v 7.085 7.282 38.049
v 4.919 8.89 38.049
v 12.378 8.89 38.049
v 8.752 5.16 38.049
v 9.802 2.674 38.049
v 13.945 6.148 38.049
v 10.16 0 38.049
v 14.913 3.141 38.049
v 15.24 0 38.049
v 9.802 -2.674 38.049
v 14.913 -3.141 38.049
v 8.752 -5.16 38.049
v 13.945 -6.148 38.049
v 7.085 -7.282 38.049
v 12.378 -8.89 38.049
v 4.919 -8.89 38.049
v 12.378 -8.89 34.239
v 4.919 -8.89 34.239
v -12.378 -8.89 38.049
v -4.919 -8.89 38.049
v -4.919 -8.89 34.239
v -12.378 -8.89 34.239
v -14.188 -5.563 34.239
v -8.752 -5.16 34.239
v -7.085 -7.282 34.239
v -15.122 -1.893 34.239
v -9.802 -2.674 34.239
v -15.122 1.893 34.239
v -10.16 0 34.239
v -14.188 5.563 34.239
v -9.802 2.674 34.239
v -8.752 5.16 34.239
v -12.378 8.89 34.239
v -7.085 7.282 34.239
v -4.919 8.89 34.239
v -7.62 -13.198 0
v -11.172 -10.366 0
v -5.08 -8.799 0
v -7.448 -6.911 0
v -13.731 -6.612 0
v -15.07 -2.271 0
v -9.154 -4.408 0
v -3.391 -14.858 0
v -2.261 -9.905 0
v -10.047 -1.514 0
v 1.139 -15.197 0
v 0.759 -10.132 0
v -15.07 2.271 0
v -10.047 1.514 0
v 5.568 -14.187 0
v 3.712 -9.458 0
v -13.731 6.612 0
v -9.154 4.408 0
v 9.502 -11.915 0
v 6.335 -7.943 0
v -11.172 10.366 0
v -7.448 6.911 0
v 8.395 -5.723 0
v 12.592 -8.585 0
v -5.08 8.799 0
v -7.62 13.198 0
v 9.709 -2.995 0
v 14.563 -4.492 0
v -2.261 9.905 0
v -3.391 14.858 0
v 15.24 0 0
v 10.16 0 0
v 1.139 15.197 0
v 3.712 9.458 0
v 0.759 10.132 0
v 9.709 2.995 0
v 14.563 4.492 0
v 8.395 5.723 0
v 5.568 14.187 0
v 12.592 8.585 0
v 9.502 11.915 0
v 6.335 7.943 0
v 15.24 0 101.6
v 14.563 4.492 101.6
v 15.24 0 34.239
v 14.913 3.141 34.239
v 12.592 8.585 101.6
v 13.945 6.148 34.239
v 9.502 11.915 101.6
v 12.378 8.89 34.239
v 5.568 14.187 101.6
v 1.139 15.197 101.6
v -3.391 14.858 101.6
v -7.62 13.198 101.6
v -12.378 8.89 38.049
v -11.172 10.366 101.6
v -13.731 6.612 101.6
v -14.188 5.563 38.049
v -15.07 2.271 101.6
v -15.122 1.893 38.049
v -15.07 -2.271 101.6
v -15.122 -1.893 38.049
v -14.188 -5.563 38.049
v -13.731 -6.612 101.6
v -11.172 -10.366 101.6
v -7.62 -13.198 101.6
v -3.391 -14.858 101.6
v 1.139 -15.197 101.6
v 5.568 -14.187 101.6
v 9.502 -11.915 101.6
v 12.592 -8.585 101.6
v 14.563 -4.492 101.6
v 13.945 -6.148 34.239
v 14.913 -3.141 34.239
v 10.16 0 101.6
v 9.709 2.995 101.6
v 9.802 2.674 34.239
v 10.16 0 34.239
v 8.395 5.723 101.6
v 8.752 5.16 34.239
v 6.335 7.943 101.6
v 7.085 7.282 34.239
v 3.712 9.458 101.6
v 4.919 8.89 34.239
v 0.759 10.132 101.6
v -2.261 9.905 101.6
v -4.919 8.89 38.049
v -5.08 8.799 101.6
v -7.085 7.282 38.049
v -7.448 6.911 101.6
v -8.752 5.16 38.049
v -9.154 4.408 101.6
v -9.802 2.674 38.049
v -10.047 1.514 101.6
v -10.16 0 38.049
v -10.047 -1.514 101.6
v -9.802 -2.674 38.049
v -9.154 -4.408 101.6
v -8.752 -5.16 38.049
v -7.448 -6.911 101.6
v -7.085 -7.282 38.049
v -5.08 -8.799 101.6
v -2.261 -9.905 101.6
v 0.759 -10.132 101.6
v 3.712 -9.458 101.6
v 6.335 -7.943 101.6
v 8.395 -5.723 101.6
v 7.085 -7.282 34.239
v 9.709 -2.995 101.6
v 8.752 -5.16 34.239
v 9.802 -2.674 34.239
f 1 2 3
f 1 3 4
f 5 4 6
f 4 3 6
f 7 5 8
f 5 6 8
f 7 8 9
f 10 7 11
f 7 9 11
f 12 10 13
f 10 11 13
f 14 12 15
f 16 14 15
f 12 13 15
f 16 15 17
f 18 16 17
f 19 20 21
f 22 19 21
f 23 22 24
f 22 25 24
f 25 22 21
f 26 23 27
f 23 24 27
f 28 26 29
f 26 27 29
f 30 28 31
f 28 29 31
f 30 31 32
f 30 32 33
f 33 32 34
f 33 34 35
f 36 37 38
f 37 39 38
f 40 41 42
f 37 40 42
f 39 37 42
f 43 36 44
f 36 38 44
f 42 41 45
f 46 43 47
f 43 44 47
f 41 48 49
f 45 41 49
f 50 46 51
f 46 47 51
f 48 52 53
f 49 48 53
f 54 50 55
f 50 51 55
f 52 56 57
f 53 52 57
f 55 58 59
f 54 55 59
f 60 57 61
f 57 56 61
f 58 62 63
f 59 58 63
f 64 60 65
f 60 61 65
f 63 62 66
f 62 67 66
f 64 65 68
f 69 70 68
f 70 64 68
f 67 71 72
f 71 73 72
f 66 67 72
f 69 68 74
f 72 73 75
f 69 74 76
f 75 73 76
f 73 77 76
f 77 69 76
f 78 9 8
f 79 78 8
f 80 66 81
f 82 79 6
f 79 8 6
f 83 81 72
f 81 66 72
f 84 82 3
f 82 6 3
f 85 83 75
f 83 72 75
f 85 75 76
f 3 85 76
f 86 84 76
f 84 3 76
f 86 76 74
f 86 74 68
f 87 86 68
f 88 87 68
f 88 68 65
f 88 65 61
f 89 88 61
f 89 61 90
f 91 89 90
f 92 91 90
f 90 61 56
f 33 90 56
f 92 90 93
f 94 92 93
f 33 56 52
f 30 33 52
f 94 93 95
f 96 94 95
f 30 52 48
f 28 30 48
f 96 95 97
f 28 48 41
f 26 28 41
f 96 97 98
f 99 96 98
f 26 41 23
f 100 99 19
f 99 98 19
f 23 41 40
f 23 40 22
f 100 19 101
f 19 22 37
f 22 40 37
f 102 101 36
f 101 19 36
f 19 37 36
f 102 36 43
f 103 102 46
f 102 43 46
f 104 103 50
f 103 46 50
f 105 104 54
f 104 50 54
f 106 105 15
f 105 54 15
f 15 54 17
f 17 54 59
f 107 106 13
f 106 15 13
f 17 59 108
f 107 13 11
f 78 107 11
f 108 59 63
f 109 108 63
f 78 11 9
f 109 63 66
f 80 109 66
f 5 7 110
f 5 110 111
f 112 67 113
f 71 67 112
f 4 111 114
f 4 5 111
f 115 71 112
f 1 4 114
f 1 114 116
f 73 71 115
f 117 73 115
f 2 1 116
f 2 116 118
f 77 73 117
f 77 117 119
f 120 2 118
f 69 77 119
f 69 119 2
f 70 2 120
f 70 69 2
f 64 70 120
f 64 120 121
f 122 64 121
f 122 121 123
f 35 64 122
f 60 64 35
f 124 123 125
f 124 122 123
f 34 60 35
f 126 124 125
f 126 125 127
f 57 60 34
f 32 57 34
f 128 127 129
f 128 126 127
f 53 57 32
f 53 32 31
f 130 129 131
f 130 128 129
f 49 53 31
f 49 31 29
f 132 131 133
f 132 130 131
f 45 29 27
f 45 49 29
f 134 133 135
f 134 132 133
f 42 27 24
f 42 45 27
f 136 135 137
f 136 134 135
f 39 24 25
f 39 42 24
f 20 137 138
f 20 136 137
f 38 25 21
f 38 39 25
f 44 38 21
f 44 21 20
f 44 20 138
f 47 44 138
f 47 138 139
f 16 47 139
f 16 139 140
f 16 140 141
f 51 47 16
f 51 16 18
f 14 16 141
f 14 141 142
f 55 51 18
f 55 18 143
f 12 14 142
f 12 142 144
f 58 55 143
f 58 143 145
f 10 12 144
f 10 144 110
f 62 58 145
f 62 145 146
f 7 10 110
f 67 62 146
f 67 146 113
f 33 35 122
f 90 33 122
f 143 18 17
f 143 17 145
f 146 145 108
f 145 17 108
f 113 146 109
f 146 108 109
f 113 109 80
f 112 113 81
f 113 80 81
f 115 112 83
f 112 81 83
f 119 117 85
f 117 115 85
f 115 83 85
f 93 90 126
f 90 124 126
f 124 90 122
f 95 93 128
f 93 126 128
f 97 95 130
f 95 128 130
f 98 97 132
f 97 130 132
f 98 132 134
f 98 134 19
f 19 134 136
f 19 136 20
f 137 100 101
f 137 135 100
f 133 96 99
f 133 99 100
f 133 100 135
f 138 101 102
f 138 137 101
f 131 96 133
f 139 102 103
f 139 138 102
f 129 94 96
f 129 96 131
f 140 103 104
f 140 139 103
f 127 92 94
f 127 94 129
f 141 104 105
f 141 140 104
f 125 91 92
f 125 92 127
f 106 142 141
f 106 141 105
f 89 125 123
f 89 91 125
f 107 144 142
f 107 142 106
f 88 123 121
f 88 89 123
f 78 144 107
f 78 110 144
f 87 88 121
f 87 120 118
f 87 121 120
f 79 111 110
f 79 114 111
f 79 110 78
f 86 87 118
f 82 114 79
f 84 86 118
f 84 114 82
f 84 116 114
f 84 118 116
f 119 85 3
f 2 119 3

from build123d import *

# Parameters (mm, degrees)
F0_R     = 15.24
F0_R_2   = 10.16
F1_DEPTH = 101.6
F3_DEPTH = 38.1


with BuildPart() as f1:
    # F0 (on Top) → F1 (new body)
    with BuildSketch(Plane.XY):
        Circle(F0_R)
        Circle(F0_R_2, mode=Mode.SUBTRACT)
    extrude(amount=F1_DEPTH)


with BuildPart() as f3:
    # F2 (on Right) → F3 (new body, symmetric)
    with BuildSketch(Plane.YZ):
        Polygon((-8.89, 34.2392), (0, 34.2392), (8.89, 34.2392), (8.89, 38.0492), (-8.89, 38.0492), align=None)
    extrude(amount=F3_DEPTH, both=True)


with BuildPart() as f1_1:
    add(f1.part)

    # F4: cut F3
    add(f3.part, mode=Mode.SUBTRACT)


solid = f1_1.part
